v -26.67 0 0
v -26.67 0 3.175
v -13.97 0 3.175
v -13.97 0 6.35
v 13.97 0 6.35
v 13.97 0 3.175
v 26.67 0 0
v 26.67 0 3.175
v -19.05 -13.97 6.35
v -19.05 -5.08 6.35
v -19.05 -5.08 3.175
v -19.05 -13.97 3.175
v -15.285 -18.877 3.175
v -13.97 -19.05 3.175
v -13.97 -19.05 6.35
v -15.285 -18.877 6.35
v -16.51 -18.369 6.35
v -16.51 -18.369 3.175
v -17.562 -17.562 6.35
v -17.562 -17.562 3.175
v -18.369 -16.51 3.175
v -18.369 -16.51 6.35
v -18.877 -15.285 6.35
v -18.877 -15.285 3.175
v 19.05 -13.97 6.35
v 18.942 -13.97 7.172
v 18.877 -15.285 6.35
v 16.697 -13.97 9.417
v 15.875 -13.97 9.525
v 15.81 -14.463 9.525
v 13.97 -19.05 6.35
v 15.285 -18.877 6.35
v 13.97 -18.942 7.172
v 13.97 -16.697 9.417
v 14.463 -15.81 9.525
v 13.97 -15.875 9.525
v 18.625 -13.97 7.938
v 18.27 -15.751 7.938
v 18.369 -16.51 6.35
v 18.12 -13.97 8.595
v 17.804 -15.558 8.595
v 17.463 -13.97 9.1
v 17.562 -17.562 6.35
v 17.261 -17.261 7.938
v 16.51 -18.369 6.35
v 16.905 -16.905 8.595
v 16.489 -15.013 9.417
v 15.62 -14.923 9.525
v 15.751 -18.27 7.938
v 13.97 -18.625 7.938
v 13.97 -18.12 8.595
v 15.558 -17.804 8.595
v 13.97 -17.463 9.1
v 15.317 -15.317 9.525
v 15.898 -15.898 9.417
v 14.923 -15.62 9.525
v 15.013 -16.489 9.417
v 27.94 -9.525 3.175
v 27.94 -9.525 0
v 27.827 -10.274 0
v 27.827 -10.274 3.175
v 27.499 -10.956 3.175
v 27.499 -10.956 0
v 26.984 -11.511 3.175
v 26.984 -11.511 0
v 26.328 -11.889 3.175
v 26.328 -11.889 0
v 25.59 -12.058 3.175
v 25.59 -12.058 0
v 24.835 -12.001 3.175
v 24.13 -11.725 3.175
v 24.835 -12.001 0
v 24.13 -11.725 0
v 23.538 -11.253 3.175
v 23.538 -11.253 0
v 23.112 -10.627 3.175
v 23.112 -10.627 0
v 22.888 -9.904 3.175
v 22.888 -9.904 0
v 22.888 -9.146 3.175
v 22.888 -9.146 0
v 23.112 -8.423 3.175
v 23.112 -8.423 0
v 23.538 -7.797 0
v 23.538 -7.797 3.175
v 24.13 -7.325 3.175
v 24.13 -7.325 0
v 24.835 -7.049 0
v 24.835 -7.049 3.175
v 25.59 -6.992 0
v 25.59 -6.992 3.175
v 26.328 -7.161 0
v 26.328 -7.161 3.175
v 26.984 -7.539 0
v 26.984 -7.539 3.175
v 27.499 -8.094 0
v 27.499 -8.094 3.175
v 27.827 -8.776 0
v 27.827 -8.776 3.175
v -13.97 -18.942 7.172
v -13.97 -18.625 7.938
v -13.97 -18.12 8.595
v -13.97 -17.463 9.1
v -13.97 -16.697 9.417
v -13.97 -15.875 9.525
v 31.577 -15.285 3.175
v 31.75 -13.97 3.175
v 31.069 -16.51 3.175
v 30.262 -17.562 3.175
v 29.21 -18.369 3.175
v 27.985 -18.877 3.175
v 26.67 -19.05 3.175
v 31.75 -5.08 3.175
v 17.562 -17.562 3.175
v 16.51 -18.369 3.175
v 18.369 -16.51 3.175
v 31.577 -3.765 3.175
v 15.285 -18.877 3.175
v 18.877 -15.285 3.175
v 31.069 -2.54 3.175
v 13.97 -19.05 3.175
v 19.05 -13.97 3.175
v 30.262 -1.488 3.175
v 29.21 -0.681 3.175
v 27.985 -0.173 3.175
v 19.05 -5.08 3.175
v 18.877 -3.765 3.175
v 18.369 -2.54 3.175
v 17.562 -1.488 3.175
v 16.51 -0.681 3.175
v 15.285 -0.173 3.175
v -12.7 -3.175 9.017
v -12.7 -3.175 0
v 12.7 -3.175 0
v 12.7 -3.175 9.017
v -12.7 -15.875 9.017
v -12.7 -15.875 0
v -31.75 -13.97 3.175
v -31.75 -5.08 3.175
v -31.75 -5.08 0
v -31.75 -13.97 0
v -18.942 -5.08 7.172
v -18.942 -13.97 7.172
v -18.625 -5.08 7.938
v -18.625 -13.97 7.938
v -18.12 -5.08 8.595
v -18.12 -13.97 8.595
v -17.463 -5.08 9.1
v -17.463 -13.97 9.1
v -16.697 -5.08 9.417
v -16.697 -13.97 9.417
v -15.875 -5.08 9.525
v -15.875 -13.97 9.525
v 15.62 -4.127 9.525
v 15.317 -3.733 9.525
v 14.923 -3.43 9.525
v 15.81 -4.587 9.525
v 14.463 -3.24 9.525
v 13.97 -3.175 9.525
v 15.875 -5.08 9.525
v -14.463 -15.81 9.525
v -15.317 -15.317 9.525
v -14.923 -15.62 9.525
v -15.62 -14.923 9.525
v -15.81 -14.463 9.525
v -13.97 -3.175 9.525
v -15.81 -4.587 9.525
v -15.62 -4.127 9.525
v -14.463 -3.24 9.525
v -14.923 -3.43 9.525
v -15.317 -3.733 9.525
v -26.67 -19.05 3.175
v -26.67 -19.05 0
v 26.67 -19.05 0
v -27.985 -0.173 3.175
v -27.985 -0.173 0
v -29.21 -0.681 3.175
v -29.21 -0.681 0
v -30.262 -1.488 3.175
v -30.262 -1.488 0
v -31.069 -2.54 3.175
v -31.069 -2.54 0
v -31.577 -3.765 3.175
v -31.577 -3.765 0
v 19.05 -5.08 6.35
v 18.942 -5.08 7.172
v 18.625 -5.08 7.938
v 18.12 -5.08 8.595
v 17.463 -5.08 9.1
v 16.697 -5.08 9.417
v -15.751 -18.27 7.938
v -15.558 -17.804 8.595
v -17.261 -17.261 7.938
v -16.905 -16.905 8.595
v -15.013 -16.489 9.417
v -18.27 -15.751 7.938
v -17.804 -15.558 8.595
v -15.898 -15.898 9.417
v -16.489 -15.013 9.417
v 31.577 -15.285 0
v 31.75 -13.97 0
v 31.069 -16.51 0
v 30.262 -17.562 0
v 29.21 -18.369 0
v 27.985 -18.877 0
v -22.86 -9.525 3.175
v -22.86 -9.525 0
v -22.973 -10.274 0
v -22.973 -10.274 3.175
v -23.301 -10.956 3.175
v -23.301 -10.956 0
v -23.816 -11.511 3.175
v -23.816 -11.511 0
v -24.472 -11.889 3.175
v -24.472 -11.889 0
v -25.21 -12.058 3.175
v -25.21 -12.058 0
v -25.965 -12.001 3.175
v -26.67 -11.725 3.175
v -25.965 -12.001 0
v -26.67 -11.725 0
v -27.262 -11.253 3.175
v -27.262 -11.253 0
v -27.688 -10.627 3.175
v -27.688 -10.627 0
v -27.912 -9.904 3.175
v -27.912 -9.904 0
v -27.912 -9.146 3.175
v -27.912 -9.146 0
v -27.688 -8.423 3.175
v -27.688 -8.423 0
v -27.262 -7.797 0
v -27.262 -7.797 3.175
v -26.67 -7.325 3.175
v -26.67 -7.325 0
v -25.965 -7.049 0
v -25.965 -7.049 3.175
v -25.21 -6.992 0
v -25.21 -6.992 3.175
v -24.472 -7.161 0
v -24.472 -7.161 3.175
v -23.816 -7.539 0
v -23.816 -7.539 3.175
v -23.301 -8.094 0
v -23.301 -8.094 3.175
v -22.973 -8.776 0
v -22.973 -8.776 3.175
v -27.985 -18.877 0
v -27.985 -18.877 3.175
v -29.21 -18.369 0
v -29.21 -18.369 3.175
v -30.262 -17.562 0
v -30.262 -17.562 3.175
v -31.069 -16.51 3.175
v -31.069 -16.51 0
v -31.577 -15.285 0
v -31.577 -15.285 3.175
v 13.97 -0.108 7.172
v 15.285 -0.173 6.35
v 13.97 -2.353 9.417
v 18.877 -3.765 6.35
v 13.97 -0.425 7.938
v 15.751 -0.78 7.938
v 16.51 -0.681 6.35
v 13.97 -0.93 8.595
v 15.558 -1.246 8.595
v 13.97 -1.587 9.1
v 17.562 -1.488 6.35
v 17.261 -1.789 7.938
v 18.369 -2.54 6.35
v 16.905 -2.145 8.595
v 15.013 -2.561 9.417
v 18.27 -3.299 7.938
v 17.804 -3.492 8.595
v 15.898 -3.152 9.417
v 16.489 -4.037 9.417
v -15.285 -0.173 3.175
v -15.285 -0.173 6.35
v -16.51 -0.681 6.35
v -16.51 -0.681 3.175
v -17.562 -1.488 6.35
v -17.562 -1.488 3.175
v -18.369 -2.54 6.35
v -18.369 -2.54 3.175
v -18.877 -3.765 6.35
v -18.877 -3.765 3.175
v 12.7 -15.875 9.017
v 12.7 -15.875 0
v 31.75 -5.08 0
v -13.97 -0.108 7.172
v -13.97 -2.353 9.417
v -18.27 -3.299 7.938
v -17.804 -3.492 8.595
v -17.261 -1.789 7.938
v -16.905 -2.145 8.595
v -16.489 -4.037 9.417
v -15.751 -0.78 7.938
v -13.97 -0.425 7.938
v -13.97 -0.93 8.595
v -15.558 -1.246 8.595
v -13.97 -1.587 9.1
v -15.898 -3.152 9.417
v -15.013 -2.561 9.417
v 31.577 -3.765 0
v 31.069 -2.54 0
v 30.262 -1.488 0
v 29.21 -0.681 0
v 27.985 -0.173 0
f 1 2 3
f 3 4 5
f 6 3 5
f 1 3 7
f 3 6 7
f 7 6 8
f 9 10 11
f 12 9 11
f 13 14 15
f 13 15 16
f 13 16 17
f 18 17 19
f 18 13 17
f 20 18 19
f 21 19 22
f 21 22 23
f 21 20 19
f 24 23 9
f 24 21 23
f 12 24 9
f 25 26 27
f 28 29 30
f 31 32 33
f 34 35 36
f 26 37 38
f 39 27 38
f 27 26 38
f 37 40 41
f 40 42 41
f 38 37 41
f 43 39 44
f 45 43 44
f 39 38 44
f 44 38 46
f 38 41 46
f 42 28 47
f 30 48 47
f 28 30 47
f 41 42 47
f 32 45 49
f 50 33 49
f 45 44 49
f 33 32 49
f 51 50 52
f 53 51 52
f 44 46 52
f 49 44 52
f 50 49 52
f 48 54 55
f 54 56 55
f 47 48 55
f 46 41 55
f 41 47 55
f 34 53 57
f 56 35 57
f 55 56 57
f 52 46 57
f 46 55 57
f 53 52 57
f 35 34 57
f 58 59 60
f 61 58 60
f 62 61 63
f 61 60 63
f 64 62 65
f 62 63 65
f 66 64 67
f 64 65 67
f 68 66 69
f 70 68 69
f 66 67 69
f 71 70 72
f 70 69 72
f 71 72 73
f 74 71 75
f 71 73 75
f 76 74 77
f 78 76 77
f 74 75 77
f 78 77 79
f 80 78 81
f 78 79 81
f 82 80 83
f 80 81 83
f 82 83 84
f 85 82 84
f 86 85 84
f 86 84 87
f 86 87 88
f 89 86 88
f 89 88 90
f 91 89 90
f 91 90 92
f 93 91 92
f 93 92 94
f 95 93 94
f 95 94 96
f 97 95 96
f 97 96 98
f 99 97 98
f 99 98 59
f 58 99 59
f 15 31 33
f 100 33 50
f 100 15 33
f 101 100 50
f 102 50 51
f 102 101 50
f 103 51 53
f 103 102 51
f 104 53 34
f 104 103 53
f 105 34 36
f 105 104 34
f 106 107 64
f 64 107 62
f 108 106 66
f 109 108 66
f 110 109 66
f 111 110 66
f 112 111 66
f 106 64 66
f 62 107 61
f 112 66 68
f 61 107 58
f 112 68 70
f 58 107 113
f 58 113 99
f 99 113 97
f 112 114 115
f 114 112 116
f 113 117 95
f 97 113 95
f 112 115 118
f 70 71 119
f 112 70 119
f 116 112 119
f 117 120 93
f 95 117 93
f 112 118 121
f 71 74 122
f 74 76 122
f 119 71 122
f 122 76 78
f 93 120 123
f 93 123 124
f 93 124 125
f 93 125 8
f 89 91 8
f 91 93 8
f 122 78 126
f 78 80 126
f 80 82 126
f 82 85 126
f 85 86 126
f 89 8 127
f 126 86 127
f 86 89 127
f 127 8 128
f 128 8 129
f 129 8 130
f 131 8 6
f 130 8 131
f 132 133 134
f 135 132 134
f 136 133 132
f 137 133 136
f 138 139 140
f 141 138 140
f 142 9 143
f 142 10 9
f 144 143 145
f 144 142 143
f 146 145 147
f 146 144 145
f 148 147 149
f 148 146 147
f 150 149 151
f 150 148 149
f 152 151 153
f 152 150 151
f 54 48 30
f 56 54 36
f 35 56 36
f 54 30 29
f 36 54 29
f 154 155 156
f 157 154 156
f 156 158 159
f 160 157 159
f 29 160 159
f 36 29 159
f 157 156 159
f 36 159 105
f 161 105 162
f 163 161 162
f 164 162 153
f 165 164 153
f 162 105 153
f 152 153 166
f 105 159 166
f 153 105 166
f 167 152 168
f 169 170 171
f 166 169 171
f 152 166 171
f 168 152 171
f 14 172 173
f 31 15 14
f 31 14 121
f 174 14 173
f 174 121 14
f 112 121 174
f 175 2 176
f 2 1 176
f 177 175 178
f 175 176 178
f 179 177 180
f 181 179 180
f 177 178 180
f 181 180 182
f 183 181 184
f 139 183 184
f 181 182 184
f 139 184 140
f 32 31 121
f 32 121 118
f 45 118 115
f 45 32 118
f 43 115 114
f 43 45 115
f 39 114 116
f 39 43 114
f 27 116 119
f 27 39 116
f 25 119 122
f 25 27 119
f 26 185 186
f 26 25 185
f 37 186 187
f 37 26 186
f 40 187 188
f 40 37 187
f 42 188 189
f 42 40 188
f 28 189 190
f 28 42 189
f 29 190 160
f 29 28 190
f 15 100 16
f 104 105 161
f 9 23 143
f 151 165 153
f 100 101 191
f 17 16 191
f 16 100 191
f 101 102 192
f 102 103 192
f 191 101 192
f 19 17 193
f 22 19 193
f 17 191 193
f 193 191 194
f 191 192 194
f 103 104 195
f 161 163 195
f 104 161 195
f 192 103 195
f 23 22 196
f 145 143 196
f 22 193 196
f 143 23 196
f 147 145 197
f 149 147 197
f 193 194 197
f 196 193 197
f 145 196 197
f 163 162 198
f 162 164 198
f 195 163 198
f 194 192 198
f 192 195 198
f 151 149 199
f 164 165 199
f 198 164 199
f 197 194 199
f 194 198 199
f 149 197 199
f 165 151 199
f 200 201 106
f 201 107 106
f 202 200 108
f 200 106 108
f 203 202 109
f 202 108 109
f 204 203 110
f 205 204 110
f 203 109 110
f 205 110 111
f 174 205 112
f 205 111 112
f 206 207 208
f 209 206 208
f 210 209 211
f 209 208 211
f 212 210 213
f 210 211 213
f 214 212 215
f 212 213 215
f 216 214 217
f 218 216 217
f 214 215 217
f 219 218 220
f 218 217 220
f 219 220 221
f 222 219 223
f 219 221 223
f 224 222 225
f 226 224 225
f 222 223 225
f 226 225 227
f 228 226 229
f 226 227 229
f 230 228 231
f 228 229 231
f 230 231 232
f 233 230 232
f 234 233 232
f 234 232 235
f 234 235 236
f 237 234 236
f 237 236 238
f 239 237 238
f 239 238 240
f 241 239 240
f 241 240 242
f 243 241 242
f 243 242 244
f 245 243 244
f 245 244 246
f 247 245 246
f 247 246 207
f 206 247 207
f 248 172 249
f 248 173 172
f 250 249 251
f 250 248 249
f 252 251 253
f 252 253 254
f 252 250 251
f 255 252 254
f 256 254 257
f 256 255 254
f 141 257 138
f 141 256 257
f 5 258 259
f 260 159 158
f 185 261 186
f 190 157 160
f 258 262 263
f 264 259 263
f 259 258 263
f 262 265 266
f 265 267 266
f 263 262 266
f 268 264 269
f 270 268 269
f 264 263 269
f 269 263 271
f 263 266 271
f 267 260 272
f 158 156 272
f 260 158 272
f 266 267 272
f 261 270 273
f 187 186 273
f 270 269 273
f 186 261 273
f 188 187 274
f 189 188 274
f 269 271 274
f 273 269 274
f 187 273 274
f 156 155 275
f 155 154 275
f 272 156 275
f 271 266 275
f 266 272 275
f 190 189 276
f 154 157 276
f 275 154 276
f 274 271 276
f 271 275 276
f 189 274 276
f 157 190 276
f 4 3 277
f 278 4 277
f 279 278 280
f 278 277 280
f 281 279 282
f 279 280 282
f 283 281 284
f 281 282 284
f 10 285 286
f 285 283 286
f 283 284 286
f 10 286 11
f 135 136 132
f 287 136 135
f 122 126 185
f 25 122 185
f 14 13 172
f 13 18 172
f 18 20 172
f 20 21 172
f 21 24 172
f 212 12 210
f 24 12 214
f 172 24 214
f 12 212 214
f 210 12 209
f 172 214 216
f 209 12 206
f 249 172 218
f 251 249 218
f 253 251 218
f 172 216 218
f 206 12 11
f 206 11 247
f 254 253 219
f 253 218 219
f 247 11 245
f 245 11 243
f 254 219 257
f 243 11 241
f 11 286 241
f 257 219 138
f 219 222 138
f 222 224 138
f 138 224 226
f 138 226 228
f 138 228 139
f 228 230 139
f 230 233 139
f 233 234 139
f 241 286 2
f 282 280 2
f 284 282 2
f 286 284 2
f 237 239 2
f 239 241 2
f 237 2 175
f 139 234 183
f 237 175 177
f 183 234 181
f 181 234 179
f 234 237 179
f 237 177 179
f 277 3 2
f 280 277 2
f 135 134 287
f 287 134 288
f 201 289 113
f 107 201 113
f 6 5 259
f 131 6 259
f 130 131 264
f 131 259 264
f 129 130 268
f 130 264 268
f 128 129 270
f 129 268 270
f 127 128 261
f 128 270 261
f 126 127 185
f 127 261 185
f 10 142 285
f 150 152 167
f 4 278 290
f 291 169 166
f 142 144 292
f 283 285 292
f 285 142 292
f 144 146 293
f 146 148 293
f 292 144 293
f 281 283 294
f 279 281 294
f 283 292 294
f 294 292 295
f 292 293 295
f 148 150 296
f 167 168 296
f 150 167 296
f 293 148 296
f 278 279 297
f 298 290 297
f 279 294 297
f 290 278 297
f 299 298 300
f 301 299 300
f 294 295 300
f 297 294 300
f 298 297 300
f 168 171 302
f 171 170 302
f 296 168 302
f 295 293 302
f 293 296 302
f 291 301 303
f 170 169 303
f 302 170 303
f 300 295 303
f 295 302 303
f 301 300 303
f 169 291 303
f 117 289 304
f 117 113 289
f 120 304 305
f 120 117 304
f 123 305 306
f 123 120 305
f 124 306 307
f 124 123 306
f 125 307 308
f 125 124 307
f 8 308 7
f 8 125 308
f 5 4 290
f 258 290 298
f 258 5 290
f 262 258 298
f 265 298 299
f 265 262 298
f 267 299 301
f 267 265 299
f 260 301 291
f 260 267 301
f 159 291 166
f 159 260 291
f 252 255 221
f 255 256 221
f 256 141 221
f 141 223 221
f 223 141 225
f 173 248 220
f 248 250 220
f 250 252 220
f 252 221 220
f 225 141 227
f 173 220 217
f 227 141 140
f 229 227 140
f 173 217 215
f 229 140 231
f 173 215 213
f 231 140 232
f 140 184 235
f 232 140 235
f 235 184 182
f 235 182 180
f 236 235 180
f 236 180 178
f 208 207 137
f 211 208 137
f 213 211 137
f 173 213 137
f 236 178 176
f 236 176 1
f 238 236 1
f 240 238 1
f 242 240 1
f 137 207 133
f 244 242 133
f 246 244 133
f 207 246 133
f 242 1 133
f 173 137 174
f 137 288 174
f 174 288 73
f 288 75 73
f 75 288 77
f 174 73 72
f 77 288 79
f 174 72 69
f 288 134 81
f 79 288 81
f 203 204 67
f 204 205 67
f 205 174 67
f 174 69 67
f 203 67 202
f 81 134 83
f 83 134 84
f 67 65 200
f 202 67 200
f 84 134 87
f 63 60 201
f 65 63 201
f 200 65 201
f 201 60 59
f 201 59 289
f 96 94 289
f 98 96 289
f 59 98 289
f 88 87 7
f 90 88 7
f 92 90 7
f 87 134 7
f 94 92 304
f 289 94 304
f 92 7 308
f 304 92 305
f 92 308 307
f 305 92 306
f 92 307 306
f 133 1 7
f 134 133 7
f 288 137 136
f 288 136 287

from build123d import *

# Parameters (mm, degrees)
F1_DEPTH = 19.05
F2_R     = 2.54
F3_DEPTH = 25.4
F4_R     = 5.08
F5_R     = 3.175
F6_W     = 25.4
F6_H     = 12.7
F7_DEPTH = 9.017


with BuildPart() as f1:
    # F0 (on Front) → F1 (new body)
    with BuildSketch(Plane.XZ):
        Polygon((-12.7, 0), (0, 0), (12.7, 0), (31.75, 0), (31.75, 3.175), (19.05, 3.175), (19.05, 9.525), (-19.05, 9.525), (-19.05, 3.175), (-31.75, 3.175), (-31.75, 0), align=None)
    extrude(amount=F1_DEPTH)

    # F2 (on face) → F3 (cut)
    with BuildSketch(Plane(origin=(0, 0, 0), x_dir=(1, 0, 0), z_dir=(0, 0, -1))):
        with Locations((-25.4, 9.525)):
            Circle(F2_R)
        with Locations((25.4, 9.525)):
            Circle(F2_R)
    extrude(amount=-F3_DEPTH, mode=Mode.SUBTRACT)

    # F4
    f4_edges = [f1.edges().sort_by_distance(p)[0] for p in [
        (-31.75, -19.05, 1.5875),
        (31.75, -19.05, 1.5875),
        (31.75, 0, 1.5875),
        (-31.75, 0, 1.5875),
        (19.05, 0, 6.35),
        (-19.05, 0, 6.35),
        (19.05, -19.05, 6.35),
        (-19.05, -19.05, 6.35),
    ]]
    fillet(f4_edges, radius=F4_R)

    # F5
    f5_edges = [f1.edges().sort_by_distance(p)[0] for p in [
        (-17.562102, -17.562102, 9.525),
    ]]
    fillet(f5_edges, radius=F5_R)

    # F6 (on face) → F7 (cut)
    with BuildSketch(Plane(origin=(0, 0, 0), x_dir=(1, 0, 0), z_dir=(0, 0, -1))):
        with Locations((0, 9.525)):
            Rectangle(F6_W, F6_H)
    extrude(amount=-F7_DEPTH, mode=Mode.SUBTRACT)


solid = f1.part
